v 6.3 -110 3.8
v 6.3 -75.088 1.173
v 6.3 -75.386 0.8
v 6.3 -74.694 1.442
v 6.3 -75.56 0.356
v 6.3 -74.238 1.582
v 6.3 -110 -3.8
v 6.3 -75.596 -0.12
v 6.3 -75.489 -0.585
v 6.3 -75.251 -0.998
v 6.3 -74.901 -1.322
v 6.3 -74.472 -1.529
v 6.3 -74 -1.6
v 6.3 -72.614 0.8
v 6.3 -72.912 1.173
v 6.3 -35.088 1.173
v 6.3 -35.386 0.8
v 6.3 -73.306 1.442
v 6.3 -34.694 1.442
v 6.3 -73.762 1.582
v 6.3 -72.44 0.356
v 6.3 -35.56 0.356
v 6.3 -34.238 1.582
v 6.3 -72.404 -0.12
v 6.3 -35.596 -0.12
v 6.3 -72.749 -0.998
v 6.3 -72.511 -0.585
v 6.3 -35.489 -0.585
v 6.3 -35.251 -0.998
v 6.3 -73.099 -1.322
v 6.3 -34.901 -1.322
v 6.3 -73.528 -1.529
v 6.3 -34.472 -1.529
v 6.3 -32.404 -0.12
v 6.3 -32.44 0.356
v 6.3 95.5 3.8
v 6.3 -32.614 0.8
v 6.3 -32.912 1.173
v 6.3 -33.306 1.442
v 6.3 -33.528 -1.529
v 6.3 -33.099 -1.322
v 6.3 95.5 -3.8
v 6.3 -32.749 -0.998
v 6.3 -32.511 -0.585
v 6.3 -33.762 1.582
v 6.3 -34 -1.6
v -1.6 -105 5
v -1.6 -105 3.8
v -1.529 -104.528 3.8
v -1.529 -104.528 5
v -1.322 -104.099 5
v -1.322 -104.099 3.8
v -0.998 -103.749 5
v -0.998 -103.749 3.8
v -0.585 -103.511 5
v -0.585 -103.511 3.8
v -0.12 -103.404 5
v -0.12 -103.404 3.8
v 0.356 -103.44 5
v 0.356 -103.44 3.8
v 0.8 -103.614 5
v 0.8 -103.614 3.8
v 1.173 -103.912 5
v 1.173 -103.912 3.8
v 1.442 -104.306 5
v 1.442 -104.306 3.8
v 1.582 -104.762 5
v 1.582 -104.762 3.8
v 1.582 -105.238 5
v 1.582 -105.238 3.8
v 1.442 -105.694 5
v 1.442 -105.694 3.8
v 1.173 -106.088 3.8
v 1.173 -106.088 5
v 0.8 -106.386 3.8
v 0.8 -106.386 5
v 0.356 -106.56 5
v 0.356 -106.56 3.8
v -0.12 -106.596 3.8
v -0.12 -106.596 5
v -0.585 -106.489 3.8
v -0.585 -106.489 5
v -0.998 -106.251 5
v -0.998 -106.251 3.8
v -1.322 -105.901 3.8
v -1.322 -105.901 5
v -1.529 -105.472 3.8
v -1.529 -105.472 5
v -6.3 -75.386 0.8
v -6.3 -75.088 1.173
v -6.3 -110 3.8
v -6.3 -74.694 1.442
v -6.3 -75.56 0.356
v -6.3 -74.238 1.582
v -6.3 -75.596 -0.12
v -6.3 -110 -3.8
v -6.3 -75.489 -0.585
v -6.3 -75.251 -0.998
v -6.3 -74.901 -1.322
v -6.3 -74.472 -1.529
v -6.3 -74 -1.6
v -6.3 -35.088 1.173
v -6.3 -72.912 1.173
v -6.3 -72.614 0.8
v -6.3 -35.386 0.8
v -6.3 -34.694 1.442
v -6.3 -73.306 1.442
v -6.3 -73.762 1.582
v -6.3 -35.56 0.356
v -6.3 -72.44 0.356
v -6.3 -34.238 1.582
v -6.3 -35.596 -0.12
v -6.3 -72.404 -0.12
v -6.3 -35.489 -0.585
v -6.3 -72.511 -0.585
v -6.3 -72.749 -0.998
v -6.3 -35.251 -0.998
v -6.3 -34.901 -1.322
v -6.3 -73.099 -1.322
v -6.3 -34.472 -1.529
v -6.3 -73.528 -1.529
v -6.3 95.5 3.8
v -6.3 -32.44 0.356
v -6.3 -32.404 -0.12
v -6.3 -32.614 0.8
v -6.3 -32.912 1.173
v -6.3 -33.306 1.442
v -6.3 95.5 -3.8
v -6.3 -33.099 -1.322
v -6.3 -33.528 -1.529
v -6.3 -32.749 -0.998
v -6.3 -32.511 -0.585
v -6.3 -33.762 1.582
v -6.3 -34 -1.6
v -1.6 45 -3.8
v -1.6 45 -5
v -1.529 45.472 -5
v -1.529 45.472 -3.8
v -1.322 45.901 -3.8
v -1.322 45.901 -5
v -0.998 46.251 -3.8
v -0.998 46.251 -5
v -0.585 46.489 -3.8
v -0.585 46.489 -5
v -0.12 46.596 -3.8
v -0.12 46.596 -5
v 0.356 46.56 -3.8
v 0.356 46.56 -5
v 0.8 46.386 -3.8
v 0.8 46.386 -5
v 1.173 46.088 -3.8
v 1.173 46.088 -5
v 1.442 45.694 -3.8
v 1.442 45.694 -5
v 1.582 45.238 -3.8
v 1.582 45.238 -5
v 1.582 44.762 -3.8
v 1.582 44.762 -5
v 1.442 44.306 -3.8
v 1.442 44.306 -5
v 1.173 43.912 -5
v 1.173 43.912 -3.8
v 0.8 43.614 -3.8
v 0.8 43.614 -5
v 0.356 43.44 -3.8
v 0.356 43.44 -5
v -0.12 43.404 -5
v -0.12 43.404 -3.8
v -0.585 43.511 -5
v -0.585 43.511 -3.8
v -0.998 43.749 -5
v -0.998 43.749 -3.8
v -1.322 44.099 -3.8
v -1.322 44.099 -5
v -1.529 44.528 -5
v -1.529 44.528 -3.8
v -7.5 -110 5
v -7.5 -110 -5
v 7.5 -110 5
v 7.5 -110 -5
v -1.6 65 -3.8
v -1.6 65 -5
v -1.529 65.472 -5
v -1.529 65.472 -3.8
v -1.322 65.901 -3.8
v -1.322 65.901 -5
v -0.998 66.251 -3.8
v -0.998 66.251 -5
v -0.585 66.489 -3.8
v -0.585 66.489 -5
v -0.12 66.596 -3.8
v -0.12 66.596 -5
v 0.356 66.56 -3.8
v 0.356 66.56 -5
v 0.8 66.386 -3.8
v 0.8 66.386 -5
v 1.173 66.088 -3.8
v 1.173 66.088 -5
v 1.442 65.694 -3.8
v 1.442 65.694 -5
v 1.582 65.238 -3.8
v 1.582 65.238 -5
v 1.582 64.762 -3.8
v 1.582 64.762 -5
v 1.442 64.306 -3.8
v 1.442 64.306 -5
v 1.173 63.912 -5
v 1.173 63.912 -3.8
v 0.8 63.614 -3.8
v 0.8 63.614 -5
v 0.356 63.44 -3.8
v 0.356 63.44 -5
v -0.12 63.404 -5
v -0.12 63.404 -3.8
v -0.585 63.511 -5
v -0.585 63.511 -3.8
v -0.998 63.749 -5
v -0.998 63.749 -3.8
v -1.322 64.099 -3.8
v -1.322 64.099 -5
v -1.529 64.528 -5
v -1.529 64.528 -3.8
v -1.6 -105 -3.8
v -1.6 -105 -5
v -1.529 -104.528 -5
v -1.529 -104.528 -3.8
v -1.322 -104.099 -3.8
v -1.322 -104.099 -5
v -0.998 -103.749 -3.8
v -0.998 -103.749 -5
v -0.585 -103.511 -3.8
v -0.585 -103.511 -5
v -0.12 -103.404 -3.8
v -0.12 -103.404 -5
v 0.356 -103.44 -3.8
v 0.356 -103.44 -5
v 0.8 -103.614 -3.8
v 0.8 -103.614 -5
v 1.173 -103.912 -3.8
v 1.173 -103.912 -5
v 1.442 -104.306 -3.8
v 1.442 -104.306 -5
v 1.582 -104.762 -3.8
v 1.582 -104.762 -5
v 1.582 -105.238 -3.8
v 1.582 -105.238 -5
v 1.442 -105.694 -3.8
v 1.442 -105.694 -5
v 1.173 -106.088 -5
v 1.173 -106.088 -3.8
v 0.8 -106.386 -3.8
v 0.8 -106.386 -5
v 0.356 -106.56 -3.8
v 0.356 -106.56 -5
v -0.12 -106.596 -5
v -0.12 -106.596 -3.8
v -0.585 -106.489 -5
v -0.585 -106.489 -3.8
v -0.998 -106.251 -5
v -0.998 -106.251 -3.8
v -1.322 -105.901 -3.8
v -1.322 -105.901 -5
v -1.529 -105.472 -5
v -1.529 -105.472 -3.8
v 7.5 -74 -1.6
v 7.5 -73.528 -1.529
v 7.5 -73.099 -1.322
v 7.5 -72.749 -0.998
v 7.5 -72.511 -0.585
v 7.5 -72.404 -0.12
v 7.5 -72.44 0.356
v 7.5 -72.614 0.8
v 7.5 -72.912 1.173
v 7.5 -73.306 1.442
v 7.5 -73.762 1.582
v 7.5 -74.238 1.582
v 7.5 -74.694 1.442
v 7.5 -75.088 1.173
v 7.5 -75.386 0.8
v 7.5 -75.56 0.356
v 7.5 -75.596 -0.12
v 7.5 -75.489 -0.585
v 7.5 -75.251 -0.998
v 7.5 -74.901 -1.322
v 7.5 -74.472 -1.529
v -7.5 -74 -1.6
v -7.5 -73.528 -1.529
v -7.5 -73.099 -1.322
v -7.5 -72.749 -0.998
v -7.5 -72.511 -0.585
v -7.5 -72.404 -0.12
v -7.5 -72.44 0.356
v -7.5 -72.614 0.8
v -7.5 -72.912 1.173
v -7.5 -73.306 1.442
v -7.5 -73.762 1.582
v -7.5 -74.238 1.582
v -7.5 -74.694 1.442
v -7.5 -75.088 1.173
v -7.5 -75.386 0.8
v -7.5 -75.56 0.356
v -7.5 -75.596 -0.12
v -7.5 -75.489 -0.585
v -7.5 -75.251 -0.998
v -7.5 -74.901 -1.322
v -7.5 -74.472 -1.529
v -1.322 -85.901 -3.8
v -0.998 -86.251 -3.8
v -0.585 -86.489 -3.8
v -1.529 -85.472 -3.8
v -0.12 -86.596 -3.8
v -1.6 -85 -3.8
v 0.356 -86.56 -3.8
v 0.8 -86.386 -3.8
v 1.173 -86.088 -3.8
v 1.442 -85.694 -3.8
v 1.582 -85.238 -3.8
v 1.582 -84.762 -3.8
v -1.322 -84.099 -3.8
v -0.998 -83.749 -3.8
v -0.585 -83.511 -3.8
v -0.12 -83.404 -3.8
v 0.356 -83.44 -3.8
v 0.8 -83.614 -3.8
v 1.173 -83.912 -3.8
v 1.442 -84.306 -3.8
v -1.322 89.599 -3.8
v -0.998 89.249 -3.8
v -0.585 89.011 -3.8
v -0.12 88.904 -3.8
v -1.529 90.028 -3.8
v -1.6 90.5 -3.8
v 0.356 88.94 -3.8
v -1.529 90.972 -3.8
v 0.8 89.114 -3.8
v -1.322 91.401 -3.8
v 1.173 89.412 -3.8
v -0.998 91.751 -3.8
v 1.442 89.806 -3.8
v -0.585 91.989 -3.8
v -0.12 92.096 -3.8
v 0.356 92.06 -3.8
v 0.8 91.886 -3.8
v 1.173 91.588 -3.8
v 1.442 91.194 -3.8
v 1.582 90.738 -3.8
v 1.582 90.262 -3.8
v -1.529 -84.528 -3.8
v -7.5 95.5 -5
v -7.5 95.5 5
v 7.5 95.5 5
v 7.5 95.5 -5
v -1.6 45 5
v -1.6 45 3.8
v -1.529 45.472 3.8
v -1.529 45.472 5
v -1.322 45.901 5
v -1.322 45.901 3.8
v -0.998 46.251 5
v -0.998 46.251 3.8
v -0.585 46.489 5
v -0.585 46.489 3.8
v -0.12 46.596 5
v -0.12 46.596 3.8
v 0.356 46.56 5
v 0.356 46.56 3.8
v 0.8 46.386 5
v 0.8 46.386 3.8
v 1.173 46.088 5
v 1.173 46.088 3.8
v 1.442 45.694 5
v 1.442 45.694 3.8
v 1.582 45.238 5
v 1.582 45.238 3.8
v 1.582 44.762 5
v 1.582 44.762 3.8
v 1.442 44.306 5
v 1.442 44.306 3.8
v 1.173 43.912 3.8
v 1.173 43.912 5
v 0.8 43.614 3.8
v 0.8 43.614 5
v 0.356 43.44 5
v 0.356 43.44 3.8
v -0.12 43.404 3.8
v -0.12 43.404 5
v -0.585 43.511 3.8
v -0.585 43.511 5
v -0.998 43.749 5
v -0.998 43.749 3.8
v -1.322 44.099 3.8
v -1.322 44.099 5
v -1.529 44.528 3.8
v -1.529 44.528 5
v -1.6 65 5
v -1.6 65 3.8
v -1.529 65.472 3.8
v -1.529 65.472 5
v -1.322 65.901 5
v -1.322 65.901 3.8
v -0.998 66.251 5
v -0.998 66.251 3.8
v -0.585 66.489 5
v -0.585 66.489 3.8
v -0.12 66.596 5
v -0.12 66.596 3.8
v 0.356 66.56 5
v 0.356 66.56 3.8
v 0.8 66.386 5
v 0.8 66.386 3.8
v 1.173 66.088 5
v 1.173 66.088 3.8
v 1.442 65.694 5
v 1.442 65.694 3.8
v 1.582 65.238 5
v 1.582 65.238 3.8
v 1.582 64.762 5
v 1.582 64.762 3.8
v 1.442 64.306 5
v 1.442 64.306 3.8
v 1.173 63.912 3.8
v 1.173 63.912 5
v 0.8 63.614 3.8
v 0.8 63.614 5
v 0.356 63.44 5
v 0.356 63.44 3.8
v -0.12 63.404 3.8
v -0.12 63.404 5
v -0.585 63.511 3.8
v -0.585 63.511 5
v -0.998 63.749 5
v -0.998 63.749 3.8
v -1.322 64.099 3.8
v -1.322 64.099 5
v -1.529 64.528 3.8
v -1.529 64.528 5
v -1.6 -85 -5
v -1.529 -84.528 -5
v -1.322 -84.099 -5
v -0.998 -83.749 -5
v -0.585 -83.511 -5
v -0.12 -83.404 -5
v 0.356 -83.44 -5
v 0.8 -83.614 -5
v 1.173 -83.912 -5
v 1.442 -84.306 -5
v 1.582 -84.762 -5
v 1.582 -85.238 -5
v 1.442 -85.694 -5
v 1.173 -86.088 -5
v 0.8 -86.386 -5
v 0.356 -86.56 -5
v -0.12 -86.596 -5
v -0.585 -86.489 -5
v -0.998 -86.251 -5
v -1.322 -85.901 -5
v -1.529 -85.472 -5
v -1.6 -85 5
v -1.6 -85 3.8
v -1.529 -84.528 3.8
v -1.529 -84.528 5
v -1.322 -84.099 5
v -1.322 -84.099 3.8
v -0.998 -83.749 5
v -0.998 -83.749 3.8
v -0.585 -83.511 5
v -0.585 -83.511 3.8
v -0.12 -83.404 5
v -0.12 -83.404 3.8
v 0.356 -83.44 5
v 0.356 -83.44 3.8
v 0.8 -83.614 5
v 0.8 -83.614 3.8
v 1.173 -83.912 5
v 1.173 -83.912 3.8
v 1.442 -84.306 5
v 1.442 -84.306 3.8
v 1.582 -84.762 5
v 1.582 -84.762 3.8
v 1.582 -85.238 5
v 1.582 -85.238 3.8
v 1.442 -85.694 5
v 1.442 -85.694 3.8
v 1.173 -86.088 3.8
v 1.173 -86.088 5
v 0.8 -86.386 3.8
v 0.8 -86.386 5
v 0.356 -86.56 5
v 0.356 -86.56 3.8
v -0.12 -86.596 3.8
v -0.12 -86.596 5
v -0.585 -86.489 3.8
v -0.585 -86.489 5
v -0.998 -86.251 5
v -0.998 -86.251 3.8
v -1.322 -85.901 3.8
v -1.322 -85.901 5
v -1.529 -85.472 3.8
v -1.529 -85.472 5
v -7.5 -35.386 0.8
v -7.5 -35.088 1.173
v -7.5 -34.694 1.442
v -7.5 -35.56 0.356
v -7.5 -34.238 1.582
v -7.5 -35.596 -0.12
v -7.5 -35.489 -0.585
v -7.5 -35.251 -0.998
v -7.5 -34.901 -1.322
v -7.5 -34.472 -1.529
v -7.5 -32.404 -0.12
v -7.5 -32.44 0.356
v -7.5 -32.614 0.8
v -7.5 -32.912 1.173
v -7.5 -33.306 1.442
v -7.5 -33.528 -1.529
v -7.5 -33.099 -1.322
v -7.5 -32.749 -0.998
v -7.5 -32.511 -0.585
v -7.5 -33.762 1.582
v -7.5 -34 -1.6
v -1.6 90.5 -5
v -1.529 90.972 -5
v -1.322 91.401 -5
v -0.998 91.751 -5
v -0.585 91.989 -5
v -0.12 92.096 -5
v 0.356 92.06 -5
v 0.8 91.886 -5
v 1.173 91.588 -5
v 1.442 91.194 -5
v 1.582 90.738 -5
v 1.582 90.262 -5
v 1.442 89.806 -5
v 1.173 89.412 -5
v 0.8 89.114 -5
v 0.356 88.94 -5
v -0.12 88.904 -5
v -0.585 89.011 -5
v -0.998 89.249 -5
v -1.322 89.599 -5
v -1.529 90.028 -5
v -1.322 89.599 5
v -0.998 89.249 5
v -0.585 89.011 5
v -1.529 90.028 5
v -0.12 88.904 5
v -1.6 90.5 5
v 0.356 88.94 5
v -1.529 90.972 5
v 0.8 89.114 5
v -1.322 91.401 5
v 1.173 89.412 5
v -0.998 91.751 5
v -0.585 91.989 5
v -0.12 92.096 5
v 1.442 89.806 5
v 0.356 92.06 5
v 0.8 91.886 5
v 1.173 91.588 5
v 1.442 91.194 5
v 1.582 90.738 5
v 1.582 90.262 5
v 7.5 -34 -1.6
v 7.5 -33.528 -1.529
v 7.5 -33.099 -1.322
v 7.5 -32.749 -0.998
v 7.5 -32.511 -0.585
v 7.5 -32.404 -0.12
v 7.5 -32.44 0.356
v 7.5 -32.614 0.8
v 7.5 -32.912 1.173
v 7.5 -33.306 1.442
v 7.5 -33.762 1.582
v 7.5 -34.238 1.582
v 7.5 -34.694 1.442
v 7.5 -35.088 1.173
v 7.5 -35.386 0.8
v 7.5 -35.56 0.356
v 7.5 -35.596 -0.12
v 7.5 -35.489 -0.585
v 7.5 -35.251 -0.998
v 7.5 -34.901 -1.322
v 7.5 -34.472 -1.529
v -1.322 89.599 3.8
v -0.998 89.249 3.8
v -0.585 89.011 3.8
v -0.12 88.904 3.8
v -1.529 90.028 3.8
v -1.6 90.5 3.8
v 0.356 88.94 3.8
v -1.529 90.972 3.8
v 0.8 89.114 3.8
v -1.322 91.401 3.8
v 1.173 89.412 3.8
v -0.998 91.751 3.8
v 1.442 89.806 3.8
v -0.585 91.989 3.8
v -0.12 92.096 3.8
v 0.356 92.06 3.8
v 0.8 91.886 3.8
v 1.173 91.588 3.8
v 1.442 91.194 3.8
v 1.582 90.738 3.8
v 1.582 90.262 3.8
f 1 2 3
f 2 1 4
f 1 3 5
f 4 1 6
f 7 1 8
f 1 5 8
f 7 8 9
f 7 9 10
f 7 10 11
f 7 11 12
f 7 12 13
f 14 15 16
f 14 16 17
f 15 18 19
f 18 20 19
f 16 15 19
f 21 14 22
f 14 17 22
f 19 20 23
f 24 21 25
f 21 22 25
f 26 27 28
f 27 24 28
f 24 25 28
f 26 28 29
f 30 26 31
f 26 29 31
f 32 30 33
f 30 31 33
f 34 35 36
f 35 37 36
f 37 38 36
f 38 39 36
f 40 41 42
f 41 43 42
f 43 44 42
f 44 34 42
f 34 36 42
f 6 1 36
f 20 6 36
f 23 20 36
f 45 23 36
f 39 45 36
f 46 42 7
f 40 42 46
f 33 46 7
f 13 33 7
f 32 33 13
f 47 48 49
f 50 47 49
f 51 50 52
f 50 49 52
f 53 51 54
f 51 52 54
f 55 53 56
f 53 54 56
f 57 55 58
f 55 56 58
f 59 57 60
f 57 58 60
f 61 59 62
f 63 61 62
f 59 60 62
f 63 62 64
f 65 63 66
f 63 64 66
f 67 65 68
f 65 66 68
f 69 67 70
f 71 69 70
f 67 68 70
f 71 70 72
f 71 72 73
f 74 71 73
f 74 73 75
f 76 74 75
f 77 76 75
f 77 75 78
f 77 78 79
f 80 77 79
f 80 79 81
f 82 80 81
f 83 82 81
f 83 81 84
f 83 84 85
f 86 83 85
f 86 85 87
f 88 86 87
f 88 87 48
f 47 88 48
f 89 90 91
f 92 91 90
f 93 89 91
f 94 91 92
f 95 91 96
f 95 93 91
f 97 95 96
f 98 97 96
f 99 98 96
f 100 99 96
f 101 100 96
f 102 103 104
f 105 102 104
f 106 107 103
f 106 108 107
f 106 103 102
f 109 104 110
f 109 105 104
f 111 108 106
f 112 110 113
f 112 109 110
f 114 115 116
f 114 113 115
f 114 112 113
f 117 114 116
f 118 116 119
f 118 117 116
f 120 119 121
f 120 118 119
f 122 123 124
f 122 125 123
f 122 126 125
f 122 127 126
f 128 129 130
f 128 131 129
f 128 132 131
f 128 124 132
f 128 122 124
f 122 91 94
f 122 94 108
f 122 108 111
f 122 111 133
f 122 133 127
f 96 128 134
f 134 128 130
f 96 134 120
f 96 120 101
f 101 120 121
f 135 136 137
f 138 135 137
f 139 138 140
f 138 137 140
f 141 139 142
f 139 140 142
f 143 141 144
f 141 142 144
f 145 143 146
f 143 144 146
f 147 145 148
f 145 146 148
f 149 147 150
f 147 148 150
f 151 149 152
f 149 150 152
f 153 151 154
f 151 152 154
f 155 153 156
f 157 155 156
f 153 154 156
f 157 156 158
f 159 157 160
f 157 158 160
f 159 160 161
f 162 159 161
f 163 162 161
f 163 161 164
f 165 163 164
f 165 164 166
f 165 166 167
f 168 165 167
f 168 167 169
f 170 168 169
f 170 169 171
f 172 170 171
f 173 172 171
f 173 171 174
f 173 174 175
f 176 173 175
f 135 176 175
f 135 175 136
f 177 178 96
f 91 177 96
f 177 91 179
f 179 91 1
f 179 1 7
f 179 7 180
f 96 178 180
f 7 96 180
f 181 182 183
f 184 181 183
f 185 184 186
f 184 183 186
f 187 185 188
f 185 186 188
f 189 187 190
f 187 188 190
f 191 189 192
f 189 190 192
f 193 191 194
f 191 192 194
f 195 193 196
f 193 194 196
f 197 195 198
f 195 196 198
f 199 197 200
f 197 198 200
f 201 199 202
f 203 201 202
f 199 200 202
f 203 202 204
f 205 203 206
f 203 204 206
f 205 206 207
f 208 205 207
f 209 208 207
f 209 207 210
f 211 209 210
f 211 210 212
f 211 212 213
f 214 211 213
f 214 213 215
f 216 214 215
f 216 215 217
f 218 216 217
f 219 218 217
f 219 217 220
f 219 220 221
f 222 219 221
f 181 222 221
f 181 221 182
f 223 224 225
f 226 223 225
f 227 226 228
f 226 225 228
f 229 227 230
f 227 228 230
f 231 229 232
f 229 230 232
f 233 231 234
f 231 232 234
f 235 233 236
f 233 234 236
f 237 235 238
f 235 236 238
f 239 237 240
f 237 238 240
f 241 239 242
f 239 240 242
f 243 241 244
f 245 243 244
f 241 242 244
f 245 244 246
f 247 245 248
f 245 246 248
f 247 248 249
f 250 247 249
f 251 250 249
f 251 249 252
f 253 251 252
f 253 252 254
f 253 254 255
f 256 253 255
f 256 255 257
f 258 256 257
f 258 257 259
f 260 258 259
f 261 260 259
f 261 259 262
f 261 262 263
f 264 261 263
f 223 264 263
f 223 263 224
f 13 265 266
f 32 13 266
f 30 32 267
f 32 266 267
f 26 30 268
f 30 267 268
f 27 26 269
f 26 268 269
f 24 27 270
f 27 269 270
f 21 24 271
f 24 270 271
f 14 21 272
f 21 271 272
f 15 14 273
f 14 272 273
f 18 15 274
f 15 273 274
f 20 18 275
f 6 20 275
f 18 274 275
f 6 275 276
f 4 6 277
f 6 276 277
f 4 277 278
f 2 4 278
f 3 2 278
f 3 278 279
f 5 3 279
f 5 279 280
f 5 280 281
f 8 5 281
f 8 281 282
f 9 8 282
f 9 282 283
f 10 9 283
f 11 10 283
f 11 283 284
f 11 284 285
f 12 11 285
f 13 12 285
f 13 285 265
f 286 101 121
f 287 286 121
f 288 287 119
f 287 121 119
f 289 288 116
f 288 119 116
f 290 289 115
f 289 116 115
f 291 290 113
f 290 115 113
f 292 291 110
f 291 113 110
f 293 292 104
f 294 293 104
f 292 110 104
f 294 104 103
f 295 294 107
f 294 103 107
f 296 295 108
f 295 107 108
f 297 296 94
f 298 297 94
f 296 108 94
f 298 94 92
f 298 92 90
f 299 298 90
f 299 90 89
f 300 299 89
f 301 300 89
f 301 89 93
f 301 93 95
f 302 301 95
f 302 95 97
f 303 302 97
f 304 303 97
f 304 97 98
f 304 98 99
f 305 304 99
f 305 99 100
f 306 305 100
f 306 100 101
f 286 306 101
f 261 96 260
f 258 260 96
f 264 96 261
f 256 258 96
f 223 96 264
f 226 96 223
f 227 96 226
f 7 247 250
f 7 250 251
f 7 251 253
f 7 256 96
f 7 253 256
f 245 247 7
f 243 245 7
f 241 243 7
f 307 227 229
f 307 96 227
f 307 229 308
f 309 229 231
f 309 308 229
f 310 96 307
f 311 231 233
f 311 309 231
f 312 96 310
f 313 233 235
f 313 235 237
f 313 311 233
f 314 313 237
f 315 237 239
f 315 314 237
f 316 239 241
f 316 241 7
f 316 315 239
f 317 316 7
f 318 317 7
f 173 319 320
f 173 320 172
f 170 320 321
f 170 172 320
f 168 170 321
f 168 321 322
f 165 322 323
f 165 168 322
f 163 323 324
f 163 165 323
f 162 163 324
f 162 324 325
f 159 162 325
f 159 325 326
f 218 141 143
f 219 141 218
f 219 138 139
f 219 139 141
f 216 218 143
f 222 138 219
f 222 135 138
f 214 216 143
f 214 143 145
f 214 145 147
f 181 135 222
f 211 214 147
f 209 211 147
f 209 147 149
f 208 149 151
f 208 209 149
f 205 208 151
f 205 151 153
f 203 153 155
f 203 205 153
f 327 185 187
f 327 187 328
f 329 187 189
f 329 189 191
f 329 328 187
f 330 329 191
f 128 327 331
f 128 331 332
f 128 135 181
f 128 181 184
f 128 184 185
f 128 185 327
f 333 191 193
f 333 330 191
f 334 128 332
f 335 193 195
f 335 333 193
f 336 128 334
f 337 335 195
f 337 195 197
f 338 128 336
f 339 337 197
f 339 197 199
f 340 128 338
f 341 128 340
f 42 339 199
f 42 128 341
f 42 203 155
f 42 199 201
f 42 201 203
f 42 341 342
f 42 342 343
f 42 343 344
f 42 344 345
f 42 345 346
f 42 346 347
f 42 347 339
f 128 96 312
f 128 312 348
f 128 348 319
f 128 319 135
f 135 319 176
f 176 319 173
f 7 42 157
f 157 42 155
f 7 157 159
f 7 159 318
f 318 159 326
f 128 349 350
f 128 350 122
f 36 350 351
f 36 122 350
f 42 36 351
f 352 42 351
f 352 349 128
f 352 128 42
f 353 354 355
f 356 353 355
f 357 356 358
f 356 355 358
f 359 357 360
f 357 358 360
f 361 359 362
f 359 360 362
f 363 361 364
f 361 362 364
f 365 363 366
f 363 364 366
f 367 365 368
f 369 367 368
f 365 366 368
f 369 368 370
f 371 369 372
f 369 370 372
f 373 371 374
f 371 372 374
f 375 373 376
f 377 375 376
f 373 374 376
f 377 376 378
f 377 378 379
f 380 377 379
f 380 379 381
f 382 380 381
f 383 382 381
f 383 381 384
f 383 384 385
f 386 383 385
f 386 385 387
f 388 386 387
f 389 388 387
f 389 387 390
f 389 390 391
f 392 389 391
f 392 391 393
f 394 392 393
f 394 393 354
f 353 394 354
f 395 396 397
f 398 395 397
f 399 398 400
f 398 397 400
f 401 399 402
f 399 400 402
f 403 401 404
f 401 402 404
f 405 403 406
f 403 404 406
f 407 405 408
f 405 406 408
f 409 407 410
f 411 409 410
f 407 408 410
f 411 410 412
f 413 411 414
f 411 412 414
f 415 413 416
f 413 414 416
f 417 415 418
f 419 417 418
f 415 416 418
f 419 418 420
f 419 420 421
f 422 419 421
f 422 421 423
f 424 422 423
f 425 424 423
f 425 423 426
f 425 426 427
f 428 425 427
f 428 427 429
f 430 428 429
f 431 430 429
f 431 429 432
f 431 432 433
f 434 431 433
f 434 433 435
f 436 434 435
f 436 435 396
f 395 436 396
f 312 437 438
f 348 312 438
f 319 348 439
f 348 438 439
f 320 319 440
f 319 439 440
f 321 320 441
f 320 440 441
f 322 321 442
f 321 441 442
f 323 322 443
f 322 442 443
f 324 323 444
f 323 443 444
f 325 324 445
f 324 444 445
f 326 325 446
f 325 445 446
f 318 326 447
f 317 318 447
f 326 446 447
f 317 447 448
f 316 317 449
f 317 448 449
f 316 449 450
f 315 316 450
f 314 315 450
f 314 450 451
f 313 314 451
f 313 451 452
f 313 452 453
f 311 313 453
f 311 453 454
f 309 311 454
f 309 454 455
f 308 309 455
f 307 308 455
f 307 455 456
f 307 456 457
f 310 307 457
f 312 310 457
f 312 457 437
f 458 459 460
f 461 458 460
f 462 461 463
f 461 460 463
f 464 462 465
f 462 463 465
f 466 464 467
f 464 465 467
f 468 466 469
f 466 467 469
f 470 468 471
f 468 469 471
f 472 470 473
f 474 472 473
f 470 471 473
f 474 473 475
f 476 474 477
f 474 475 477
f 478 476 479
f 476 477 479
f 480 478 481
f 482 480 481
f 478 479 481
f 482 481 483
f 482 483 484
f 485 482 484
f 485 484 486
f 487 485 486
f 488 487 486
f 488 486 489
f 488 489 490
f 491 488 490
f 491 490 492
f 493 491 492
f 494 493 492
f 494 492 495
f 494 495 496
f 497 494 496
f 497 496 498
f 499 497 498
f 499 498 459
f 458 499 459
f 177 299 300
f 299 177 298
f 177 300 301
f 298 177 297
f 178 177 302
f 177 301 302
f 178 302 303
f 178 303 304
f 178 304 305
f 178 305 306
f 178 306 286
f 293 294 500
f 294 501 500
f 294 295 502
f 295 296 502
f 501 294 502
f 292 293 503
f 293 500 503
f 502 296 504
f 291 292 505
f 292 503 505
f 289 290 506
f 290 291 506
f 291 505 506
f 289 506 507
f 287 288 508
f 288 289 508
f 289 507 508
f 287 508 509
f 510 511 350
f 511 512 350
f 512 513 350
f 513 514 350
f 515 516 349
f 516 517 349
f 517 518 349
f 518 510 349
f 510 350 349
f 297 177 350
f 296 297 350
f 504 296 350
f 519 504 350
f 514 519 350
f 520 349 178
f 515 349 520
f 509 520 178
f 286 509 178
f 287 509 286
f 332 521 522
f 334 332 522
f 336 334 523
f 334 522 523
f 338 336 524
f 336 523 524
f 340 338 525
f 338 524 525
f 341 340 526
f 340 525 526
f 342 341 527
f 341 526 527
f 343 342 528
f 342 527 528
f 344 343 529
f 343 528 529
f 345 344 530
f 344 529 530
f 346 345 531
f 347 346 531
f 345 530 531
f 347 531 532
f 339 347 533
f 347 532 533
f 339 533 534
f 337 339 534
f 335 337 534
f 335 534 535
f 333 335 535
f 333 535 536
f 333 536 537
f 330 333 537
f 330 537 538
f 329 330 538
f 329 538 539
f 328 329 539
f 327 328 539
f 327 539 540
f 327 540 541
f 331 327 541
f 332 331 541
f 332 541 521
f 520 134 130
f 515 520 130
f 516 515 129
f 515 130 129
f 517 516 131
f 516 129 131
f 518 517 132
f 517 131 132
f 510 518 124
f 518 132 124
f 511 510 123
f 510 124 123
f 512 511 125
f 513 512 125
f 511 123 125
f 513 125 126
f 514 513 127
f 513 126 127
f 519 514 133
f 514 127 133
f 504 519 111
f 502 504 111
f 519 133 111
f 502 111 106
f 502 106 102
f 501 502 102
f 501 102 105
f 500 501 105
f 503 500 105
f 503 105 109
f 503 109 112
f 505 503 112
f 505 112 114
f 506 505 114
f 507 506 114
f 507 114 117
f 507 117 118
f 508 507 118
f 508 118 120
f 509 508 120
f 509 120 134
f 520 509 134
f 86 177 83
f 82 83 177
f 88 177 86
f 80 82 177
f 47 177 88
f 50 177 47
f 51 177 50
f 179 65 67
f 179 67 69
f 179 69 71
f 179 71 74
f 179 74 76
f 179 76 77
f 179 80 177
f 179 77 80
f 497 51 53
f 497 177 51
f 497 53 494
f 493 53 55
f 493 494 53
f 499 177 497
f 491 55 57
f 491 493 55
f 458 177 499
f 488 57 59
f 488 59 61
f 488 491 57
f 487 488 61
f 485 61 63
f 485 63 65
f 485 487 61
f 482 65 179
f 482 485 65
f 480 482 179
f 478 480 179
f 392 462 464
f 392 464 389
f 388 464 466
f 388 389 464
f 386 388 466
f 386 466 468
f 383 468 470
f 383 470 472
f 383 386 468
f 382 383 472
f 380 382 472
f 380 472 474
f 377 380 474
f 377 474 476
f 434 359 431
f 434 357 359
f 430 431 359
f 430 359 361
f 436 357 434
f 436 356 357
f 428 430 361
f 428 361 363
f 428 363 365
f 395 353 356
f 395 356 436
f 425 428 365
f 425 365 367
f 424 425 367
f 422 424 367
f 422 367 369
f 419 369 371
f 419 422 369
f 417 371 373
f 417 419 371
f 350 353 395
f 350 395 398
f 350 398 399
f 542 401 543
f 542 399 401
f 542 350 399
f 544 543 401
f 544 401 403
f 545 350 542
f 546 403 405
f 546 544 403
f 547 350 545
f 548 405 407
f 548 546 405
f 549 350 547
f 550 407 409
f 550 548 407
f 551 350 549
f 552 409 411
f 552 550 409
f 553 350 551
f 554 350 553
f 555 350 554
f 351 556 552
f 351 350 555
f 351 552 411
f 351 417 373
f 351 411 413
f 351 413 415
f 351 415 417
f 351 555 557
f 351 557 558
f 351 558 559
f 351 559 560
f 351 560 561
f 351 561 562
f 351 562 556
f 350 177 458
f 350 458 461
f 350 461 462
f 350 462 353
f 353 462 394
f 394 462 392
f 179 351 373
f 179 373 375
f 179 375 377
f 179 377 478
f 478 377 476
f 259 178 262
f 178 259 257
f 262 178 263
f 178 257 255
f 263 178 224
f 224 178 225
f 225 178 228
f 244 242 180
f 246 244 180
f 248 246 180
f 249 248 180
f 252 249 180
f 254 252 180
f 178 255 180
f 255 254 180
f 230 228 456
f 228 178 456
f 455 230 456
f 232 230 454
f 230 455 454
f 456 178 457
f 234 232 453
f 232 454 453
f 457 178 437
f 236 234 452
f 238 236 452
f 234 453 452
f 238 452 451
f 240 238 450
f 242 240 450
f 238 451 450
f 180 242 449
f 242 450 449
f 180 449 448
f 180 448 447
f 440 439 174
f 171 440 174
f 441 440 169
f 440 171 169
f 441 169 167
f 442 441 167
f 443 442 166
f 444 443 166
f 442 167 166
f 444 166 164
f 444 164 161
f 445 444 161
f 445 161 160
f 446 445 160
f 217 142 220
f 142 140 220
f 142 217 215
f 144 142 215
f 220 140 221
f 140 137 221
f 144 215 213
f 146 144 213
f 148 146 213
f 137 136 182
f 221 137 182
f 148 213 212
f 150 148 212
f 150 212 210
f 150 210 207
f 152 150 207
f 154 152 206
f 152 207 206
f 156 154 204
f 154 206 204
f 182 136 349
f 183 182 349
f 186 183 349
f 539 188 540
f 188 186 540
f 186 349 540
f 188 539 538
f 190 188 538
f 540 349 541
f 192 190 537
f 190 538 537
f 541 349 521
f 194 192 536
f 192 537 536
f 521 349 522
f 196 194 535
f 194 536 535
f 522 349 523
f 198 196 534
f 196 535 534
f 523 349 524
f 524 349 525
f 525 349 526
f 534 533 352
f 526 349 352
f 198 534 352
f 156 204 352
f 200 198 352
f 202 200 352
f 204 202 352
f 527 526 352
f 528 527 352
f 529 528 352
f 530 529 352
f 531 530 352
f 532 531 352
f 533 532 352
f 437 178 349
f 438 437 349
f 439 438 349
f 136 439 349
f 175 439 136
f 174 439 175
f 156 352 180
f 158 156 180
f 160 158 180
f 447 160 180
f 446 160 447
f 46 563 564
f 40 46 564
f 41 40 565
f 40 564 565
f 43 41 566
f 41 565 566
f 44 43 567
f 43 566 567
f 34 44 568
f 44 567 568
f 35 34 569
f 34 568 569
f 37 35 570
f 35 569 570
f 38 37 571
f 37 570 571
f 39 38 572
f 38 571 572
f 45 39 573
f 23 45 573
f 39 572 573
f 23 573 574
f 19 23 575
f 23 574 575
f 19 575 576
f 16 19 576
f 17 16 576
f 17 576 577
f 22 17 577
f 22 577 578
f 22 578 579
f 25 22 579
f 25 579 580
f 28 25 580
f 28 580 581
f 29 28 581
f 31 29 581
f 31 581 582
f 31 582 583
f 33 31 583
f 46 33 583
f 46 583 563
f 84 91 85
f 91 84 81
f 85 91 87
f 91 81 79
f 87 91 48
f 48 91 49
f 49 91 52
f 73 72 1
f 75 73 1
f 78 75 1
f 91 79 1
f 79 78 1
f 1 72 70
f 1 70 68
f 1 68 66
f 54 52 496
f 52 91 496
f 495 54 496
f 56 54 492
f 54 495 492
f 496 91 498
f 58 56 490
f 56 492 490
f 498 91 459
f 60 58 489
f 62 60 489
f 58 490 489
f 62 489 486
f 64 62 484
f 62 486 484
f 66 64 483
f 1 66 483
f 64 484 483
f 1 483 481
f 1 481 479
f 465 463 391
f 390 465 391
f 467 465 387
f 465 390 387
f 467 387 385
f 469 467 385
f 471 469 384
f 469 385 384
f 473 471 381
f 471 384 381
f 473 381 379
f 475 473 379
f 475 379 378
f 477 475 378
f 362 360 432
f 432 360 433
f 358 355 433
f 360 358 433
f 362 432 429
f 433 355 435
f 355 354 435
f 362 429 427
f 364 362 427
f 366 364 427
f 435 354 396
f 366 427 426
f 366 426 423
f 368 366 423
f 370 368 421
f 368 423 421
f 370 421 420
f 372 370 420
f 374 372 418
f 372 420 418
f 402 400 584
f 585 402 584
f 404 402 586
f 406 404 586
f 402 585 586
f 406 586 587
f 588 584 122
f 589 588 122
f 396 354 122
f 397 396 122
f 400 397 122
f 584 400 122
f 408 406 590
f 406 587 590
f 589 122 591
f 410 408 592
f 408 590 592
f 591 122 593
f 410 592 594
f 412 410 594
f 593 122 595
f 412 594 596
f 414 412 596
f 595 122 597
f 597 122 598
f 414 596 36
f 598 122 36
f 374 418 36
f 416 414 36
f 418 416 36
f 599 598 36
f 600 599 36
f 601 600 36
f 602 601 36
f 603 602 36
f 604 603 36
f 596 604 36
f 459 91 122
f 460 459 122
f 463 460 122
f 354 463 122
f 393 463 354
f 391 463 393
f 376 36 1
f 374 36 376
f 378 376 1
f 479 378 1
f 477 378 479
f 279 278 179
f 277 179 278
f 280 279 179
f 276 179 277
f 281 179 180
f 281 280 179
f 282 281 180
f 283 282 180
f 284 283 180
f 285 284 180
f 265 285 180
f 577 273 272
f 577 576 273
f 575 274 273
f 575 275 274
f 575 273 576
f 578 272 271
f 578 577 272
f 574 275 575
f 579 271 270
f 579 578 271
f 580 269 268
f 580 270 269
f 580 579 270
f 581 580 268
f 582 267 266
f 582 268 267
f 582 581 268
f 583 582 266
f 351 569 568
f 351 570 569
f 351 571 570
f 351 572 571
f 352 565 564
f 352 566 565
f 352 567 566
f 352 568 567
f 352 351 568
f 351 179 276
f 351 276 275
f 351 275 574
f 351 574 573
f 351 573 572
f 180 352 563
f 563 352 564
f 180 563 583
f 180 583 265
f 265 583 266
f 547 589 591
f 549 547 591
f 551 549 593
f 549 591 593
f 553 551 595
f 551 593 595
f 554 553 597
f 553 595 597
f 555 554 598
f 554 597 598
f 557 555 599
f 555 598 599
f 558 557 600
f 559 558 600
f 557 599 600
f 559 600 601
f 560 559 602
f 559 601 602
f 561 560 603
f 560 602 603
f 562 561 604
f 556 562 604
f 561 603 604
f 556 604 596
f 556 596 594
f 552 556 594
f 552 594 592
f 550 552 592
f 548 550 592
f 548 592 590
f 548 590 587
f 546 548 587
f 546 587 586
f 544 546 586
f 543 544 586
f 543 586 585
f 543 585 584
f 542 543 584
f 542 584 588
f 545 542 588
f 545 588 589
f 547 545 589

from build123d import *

# Parameters (mm, degrees)
SKETCH_1_W          = 15
SKETCH_1_H          = 10
SKETCH_1_W_2        = 12.6
SKETCH_1_H_2        = 7.6
EXTRUDE_1_DEPTH     = 110
SKETCH_2_R          = 1.6
CUT_EXTRUDE_1_DEPTH = 100
SKETCH_3_R          = 1.6
CUT_EXTRUDE_2_DEPTH = 15
SKETCH_4_R          = 1.6
CUT_EXTRUDE_3_DEPTH = 10
SKETCH_5_W          = 15
SKETCH_5_H          = 10
CUT_EXTRUDE_4_DEPTH = 14.5
SKETCH_6_R          = 1.6
CUT_EXTRUDE_5_DEPTH = 15


with BuildPart() as part:
    # ｽｹｯﾁ1 → ﾎﾞｽ - 押し出し1 (new, symmetric)
    with BuildSketch(Plane(origin=(0, 0, 0), x_dir=(1, 0, 0), z_dir=(0, 1, 0))):
        Rectangle(SKETCH_1_W, SKETCH_1_H)
        Rectangle(SKETCH_1_W_2, SKETCH_1_H_2, mode=Mode.SUBTRACT)
    extrude(amount=EXTRUDE_1_DEPTH, both=True)

    # ｽｹｯﾁ2 → ｶｯﾄ - 押し出し1 (cut)
    with BuildSketch(Plane(origin=(0, 0, -5), x_dir=(-1, 0, 0), z_dir=(0, 0, -1))):
        with Locations((0, -85)):
            Circle(SKETCH_2_R)
        with Locations((0, -105)):
            Circle(SKETCH_2_R)
    extrude(amount=-CUT_EXTRUDE_1_DEPTH, mode=Mode.SUBTRACT)

    # ｽｹｯﾁ3 → ｶｯﾄ - 押し出し2 (cut)
    with BuildSketch(Plane(origin=(7.5, 0, 0), x_dir=(0, 0, -1), z_dir=(1, 0, 0))):
        with Locations((0, -34)):
            Circle(SKETCH_3_R)
        with Locations((0, -74)):
            Circle(SKETCH_3_R)
    extrude(amount=-CUT_EXTRUDE_2_DEPTH, mode=Mode.SUBTRACT)

    # ｽｹｯﾁ4 → ｶｯﾄ - 押し出し3 (cut)
    with BuildSketch(Plane(origin=(0, 0, -5), x_dir=(-1, 0, 0), z_dir=(0, 0, -1))):
        with Locations((0, 65)):
            Circle(SKETCH_4_R)
        with Locations((0, 45)):
            Circle(SKETCH_4_R)
    extrude(amount=-CUT_EXTRUDE_3_DEPTH, mode=Mode.SUBTRACT)

    # ｽｹｯﾁ5 → ｶｯﾄ - 押し出し4 (cut)
    with BuildSketch(Plane(origin=(0, 110, 0), x_dir=(1, 0, 0), z_dir=(0, 1, 0))):
        Rectangle(SKETCH_5_W, SKETCH_5_H)
    extrude(amount=-CUT_EXTRUDE_4_DEPTH, mode=Mode.SUBTRACT)

    # ｽｹｯﾁ6 → ｶｯﾄ - 押し出し5 (cut)
    with BuildSketch(Plane(origin=(0, 0, -5), x_dir=(-1, 0, 0), z_dir=(0, 0, -1))):
        with Locations((0, 90.5)):
            Circle(SKETCH_6_R)
    extrude(amount=-CUT_EXTRUDE_5_DEPTH, mode=Mode.SUBTRACT)


solid = part.part
